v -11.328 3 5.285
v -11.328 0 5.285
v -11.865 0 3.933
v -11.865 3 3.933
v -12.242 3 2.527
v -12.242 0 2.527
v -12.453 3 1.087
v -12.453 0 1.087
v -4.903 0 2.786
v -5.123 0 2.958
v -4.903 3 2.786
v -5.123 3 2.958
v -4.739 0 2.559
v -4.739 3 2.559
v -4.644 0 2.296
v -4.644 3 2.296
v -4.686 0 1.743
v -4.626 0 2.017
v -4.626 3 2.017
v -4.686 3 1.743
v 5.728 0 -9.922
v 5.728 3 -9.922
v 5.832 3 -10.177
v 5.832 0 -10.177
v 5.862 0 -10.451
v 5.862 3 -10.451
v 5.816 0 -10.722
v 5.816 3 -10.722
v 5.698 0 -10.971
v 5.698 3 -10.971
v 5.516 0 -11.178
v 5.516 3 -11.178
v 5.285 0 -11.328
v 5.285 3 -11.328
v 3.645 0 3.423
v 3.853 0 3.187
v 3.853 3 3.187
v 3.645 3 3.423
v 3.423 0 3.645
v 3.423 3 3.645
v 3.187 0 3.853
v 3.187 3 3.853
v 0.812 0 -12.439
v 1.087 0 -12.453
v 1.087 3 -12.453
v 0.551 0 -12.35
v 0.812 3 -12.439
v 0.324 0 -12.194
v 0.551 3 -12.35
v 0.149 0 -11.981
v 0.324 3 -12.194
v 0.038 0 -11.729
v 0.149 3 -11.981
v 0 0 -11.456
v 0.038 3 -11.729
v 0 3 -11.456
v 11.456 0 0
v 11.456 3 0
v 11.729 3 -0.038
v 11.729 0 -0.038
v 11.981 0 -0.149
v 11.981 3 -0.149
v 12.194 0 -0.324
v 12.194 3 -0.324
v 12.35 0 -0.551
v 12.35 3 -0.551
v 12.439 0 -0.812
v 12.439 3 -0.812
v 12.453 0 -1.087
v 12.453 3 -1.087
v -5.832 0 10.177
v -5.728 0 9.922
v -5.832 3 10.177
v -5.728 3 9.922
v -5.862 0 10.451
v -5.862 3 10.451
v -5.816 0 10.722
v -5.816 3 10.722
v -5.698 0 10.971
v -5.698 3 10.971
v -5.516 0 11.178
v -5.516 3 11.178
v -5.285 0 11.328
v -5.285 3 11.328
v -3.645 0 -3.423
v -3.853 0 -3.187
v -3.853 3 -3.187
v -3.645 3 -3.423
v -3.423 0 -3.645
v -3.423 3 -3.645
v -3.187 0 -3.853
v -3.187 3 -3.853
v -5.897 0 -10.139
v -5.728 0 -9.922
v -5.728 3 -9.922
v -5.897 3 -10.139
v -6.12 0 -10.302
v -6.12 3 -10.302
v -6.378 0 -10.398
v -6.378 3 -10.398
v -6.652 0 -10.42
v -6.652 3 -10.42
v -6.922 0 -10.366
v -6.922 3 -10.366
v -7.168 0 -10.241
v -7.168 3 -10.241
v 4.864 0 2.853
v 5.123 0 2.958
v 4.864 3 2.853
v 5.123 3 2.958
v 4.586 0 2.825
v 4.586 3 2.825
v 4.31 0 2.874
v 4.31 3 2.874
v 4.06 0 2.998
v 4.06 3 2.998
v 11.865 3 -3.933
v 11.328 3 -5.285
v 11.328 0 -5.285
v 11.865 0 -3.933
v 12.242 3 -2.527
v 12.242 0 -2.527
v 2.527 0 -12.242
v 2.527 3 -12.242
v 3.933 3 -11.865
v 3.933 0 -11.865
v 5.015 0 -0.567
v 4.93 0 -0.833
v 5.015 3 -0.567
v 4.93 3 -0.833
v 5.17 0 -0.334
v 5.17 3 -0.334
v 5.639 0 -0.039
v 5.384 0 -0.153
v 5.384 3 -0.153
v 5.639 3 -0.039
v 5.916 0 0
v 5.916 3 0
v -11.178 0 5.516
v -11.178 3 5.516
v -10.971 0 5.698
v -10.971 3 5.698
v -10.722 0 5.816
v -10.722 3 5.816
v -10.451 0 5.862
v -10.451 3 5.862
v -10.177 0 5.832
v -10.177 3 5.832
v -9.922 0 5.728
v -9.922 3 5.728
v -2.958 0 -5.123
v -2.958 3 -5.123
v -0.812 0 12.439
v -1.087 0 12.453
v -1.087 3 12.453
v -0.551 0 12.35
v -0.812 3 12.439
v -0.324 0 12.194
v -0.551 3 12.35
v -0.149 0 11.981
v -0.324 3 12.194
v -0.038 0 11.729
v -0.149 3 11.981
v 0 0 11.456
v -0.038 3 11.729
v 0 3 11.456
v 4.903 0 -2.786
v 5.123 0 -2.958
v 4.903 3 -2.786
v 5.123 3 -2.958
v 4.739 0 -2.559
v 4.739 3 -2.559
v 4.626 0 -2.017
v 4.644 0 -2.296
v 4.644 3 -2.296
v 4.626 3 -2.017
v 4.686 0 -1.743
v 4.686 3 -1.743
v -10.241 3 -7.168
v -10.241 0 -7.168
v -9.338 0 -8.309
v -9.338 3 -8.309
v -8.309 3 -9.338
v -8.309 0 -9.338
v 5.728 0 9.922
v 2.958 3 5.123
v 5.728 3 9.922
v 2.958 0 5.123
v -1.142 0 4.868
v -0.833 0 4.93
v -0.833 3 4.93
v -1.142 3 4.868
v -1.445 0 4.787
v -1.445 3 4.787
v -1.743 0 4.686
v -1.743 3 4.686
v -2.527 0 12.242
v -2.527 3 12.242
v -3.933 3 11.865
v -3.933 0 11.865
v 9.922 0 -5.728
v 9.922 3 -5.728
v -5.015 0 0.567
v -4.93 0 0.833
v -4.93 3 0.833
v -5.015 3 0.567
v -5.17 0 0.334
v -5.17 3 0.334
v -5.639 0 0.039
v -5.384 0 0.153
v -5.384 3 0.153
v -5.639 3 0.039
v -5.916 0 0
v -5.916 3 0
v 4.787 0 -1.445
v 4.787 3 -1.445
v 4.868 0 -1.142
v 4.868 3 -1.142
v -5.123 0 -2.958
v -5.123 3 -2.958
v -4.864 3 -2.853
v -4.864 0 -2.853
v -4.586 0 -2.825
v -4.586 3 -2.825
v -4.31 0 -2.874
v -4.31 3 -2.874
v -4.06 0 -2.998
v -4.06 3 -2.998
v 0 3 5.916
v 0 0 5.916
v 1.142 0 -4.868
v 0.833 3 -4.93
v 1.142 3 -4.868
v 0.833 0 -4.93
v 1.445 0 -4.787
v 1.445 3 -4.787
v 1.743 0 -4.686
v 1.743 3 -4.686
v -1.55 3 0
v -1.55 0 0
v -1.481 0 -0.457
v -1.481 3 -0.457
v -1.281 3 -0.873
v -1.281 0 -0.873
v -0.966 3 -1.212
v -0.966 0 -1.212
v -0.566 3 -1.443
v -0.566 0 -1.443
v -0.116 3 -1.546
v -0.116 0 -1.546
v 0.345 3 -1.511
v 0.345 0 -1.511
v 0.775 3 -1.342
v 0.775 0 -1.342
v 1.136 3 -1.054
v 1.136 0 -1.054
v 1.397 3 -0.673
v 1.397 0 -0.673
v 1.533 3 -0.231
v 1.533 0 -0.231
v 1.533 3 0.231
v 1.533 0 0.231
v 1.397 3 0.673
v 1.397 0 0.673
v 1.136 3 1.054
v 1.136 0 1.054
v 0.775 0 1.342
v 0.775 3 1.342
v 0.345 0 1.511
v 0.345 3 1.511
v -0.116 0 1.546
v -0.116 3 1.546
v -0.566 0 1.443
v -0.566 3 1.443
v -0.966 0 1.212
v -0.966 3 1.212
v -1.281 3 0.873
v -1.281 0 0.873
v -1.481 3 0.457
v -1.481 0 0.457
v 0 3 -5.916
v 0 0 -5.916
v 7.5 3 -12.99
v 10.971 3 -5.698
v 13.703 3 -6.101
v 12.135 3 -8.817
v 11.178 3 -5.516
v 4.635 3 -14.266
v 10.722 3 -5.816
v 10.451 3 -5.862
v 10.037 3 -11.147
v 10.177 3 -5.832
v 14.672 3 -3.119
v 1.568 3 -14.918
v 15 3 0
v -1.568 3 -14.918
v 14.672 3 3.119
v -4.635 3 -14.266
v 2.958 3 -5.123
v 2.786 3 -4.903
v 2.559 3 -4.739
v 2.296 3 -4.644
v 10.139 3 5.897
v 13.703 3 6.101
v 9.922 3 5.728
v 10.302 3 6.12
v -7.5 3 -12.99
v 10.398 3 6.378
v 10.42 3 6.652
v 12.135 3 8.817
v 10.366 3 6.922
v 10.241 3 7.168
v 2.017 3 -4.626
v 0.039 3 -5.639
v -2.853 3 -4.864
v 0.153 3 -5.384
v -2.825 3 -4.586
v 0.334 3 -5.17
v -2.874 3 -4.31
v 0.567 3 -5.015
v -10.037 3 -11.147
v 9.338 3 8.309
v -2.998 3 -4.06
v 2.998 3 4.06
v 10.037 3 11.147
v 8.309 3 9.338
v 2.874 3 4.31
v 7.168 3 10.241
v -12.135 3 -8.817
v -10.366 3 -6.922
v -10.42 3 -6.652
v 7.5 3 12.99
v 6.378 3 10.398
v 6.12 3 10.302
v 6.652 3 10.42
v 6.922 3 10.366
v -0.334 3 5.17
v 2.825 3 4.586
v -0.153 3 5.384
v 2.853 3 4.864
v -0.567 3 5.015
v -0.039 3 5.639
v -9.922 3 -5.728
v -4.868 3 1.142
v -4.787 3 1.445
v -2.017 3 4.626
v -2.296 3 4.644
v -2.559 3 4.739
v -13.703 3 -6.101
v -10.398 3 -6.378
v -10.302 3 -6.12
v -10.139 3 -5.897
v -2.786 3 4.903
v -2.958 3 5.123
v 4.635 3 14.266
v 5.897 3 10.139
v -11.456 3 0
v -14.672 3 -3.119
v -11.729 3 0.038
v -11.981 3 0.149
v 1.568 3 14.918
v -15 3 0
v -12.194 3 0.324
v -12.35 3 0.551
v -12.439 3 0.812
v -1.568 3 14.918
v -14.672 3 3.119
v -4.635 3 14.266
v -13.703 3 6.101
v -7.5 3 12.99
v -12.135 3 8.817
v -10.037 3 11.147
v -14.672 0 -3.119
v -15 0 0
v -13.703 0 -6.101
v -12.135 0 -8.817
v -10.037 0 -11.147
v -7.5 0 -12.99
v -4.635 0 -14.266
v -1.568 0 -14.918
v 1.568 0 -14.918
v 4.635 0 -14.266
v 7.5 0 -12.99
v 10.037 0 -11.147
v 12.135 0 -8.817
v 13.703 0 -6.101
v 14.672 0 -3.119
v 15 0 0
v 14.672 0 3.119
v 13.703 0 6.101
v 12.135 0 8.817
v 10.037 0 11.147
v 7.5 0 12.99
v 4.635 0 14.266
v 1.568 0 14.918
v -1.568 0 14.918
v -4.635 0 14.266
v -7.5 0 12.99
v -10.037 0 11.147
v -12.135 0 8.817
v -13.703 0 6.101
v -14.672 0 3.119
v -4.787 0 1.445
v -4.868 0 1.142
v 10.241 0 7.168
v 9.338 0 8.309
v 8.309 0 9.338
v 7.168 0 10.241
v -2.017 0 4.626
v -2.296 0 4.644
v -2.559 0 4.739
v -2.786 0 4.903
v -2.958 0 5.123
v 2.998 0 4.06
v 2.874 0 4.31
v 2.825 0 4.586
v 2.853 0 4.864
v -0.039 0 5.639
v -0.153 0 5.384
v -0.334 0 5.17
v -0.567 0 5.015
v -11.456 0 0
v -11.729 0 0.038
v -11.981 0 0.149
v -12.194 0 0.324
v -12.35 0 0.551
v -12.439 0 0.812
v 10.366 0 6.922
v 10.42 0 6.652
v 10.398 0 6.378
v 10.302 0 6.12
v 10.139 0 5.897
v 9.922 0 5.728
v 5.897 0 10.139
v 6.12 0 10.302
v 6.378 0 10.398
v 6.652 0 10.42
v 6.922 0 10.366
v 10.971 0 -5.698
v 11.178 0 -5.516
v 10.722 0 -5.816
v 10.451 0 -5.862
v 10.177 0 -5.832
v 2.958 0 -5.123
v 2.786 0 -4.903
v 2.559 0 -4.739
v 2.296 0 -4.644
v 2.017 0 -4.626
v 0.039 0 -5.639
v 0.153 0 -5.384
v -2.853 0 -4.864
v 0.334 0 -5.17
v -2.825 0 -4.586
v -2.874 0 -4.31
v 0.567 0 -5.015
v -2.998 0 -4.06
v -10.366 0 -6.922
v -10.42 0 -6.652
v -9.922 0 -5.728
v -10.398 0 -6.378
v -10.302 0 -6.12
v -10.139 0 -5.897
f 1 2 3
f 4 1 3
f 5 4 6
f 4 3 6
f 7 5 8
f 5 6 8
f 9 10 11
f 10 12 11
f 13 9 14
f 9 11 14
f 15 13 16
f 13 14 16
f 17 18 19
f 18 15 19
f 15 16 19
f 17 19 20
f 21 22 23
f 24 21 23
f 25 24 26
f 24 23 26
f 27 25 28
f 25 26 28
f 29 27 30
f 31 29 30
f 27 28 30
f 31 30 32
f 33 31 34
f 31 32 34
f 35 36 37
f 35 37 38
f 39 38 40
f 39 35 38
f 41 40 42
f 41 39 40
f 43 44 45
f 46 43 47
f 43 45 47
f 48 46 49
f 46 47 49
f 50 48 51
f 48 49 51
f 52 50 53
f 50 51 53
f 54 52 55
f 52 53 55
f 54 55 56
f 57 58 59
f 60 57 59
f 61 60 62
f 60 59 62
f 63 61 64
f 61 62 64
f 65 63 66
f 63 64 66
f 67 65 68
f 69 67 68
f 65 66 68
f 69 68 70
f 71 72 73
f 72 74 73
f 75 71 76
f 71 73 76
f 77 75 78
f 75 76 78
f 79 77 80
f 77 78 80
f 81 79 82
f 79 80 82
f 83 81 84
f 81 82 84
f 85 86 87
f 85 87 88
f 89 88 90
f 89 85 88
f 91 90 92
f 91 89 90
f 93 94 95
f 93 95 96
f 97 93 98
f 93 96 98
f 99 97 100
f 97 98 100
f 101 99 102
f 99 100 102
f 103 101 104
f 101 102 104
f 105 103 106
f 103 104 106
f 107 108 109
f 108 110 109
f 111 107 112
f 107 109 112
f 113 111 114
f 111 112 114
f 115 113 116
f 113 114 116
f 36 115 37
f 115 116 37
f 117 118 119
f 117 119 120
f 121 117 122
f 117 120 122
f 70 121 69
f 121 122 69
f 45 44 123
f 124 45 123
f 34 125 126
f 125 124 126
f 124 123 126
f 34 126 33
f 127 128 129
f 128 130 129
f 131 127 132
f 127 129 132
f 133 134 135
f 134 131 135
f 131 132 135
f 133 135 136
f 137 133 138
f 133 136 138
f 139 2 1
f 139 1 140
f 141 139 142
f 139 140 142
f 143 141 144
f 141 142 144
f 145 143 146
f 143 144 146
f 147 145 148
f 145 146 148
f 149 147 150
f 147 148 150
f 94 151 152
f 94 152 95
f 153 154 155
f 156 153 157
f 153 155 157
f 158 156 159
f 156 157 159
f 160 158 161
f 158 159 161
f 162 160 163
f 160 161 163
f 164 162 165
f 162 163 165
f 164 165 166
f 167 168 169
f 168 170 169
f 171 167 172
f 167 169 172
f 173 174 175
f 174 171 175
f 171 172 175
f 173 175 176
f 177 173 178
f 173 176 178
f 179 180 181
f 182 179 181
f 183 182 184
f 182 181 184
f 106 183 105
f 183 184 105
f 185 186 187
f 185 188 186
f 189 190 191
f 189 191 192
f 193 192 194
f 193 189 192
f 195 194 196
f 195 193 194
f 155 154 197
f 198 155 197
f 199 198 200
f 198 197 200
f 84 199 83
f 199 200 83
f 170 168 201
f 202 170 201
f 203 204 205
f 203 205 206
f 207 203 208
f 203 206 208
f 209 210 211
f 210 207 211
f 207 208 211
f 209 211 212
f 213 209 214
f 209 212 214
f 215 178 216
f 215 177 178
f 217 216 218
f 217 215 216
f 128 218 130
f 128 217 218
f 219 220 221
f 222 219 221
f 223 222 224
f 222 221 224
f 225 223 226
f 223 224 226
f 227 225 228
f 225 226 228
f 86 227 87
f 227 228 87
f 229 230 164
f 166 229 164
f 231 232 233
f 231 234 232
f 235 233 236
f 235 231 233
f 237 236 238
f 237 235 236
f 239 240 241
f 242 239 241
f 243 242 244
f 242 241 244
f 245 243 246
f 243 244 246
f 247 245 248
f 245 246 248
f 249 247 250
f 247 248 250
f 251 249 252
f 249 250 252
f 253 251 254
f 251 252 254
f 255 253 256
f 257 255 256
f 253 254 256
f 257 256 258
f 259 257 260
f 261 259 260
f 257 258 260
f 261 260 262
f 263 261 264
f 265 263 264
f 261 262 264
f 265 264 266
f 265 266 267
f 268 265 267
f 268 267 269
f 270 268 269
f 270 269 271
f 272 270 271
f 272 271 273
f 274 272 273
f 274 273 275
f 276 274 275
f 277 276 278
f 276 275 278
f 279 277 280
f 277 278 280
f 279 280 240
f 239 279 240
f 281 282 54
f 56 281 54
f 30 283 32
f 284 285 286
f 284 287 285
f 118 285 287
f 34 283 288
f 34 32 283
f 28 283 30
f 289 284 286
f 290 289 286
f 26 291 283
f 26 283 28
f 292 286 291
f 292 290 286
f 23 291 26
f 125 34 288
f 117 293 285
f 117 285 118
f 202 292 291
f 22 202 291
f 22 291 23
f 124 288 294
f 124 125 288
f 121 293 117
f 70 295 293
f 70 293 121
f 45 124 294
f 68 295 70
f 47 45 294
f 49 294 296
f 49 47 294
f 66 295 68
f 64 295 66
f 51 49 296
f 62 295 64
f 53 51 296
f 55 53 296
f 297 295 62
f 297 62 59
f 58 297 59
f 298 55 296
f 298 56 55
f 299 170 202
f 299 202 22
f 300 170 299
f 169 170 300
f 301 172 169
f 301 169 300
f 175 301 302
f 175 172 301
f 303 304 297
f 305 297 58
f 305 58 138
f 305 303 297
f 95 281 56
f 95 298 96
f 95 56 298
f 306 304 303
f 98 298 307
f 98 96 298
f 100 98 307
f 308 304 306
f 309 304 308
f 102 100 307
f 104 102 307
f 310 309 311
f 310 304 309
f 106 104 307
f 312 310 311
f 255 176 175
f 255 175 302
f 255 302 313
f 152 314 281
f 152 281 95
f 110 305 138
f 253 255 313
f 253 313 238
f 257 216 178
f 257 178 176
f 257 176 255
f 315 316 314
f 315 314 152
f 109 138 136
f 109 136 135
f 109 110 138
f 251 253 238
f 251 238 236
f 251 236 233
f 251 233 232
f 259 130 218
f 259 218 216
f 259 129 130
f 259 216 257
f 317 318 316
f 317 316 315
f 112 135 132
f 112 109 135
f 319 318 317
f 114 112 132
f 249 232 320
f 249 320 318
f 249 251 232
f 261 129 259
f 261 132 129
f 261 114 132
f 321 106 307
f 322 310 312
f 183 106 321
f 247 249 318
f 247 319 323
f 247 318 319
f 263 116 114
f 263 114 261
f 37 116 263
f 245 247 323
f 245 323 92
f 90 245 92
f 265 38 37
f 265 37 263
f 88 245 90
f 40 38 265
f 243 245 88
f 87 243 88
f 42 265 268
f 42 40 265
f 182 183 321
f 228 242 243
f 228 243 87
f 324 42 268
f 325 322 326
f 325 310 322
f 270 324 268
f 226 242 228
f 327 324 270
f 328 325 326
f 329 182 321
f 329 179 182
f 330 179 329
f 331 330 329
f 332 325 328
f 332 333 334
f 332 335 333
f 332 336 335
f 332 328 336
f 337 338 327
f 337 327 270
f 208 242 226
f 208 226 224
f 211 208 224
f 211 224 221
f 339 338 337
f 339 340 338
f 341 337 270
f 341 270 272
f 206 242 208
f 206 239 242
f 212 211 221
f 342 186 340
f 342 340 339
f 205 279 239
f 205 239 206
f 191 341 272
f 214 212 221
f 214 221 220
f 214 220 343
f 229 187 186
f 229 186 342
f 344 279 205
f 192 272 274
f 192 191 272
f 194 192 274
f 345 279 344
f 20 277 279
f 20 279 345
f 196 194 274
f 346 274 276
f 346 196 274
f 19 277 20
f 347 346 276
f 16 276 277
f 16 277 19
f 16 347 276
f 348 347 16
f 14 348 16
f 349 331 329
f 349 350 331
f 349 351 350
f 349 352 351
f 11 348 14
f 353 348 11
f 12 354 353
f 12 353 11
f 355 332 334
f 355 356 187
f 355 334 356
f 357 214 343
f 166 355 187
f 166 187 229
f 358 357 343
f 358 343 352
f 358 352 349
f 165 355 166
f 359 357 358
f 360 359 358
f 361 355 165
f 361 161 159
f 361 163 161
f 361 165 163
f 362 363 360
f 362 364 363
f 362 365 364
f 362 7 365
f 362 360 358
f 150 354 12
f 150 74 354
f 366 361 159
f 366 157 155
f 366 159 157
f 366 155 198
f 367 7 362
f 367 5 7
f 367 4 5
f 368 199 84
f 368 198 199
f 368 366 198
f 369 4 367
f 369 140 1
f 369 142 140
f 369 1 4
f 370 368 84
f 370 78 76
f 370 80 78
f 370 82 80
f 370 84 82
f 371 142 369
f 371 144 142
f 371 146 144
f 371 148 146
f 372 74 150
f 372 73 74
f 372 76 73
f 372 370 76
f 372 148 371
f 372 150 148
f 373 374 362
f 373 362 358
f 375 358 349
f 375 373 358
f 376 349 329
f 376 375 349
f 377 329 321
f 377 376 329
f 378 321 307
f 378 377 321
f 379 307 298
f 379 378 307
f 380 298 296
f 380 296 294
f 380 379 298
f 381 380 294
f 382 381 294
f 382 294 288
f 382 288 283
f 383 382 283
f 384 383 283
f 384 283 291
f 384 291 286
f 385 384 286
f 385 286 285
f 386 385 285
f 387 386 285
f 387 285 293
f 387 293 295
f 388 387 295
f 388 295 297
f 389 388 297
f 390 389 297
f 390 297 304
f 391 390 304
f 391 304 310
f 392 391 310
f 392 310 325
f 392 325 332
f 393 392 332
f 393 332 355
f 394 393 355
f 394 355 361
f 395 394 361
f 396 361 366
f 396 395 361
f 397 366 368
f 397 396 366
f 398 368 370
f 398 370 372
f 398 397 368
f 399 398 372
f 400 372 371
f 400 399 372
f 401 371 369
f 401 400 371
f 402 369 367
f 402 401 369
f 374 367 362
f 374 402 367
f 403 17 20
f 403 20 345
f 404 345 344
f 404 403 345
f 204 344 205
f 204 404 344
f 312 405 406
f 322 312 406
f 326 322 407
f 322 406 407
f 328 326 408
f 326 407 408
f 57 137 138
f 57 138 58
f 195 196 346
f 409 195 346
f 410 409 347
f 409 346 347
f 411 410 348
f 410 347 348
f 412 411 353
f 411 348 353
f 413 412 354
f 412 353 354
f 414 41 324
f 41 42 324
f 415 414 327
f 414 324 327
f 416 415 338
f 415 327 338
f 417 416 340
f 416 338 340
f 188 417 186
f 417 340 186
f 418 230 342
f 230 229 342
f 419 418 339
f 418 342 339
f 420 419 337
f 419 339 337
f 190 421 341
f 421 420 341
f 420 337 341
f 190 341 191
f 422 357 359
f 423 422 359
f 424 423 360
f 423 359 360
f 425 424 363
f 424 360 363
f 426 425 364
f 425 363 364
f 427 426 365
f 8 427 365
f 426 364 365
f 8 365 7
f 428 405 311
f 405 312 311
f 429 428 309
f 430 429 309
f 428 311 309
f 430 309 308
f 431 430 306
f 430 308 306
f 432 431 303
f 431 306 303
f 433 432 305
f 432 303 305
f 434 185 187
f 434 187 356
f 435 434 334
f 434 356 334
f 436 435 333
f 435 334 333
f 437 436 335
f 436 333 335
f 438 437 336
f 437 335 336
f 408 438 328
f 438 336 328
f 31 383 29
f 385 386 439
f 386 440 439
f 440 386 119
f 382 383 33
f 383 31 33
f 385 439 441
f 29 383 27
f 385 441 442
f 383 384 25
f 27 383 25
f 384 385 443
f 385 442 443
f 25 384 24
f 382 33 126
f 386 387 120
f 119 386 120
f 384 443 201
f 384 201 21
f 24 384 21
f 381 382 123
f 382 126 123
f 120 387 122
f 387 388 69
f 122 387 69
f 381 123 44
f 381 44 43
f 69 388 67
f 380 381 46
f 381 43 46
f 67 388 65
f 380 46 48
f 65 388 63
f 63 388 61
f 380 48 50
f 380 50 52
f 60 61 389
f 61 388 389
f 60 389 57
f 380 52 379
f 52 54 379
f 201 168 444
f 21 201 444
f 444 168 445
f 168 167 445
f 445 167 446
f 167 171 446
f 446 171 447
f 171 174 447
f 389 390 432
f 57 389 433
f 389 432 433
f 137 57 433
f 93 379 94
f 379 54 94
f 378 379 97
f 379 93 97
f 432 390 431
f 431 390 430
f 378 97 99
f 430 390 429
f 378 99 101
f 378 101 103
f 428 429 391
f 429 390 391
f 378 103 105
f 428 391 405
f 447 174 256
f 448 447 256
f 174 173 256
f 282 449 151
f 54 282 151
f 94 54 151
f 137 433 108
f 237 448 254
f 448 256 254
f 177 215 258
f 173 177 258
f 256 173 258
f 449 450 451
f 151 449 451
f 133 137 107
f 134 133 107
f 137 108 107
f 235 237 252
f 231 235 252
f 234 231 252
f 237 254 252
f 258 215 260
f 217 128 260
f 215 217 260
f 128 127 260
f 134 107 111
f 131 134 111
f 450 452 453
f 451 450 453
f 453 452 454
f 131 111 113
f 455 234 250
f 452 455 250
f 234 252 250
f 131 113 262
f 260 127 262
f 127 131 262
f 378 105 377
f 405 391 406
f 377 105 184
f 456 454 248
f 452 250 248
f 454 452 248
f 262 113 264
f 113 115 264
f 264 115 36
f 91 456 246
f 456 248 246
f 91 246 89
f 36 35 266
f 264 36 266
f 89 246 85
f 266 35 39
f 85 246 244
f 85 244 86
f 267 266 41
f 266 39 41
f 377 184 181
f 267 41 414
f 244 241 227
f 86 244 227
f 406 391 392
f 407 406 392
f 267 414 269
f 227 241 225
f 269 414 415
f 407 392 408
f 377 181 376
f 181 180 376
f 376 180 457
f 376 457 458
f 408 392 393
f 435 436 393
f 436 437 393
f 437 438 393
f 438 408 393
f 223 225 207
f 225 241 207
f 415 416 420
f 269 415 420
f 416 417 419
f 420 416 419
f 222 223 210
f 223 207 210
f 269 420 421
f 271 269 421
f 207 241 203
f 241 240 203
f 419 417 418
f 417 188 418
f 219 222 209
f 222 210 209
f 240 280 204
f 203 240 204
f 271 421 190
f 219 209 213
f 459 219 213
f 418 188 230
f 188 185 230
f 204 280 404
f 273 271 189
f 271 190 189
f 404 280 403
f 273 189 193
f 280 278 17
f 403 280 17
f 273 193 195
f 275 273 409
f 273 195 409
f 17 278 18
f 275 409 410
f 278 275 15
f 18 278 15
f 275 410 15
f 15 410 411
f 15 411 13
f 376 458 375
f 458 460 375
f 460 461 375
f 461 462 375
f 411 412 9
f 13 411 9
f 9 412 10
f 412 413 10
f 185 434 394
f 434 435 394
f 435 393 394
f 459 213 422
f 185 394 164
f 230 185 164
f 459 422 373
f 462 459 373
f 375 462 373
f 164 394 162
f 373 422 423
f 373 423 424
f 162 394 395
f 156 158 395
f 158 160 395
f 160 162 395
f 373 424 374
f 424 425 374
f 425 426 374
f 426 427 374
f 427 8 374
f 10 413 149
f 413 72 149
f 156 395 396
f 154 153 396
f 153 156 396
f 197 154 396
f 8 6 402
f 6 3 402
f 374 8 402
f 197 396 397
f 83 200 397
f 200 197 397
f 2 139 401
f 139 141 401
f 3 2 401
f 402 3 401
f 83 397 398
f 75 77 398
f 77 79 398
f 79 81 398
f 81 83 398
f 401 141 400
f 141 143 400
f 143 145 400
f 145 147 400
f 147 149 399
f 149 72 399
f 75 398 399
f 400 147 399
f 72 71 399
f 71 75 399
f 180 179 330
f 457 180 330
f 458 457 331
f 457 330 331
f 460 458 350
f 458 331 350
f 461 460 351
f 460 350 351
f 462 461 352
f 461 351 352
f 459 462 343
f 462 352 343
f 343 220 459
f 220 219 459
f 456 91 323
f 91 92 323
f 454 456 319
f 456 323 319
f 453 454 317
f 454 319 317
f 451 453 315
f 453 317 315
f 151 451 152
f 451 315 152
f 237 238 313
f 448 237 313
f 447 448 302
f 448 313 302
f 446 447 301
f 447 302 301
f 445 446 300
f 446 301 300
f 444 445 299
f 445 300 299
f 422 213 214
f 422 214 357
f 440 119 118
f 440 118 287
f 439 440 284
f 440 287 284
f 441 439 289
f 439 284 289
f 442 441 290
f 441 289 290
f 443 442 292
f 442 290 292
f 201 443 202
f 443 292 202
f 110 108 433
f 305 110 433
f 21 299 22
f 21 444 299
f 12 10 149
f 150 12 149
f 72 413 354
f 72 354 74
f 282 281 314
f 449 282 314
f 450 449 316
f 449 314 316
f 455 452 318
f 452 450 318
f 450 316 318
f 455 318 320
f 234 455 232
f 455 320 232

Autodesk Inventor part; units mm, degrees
ref_plane "YZ Plane" through (0, 0, 0) normal (1, 0, 0) x (0, 1, 0)
ref_plane "XZ Plane" through (0, 0, 0) normal (0, 1, 0) x (-1, 0, 0)
ref_plane "XY Plane" through (0, 0, 0) normal (0, 0, 1) x (1, 0, 0)
sketch "草圖1" plane through (0, 0, 0) normal (0, 1, 0) x (-1, 0, 0)
  circle A0 centre (0, 0) radius 15
  line L0 (0, 0) -> (15, 0)
  line L1 (0, 0) -> (7.5, -12.9904)
  line L2 (0, 0) -> (12.9904, -7.5)
  circle A1 centre (0, 0) radius 12.5
  circle A2 centre (0, 0) radius 5
  circle A3 centre (0, 0) radius 1.55
  point P0 (6.25, -10.8253)
  point P1 (2.5, -4.3301)
  point P2 (4.3301, -2.5)
  point P3 (10.8253, -6.25)
  dimension "d0" = 30
  dimension "d1" = 60
  dimension "d2" = 30
  dimension "d3" = 25
  dimension "d4" = 10
  dimension "d12" = 3.1
extrude "擠出1" add sketch "草圖1" along normal blind 3
extrude "擠出2" cut sketch "草圖1" along normal blind 3 contours L1 A2 L2 A1
pattern_circular "環形陣列1" count 6 over 360 about axis through (0, -10, 0) along (0, 1, 0) of "擠出2"
extrude "擠出3" cut sketch "草圖1" along normal blind 3 contours A3 L2 L0 | L0 L1 A3 | L1 L2 A3
fillet "圓角1" radius 1 24 edges at (-2.5, 1.5, -4.3301) (2.5, 1.5, -4.3301) (12.5, 1.5, 0) (0, 1.5, 12.5) (-4.3301, 1.5, 2.5) (-4.3301, 1.5, -2.5) (-6.25, 1.5, -10.8253) (0, 1.5, -12.5) (10.8253, 1.5, -6.25) (4.3301, 1.5, 2.5) (-2.5, 1.5, 4.3301) (-5, 1.5, 0) (6.25, 1.5, -10.8253) (0, 1.5, 5) (2.5, 1.5, 4.3301) (0, 1.5, -5) (-10.8253, 1.5, 6.25) (-6.25, 1.5, 10.8253) (6.25, 1.5, 10.8253) (10.8253, 1.5, 6.25) (-10.8253, 1.5, -6.25) (-12.5, 1.5, 0) (4.3301, 1.5, -2.5) (5, 1.5, 0)
properties material "MDF Medium Density Fiberboard"
